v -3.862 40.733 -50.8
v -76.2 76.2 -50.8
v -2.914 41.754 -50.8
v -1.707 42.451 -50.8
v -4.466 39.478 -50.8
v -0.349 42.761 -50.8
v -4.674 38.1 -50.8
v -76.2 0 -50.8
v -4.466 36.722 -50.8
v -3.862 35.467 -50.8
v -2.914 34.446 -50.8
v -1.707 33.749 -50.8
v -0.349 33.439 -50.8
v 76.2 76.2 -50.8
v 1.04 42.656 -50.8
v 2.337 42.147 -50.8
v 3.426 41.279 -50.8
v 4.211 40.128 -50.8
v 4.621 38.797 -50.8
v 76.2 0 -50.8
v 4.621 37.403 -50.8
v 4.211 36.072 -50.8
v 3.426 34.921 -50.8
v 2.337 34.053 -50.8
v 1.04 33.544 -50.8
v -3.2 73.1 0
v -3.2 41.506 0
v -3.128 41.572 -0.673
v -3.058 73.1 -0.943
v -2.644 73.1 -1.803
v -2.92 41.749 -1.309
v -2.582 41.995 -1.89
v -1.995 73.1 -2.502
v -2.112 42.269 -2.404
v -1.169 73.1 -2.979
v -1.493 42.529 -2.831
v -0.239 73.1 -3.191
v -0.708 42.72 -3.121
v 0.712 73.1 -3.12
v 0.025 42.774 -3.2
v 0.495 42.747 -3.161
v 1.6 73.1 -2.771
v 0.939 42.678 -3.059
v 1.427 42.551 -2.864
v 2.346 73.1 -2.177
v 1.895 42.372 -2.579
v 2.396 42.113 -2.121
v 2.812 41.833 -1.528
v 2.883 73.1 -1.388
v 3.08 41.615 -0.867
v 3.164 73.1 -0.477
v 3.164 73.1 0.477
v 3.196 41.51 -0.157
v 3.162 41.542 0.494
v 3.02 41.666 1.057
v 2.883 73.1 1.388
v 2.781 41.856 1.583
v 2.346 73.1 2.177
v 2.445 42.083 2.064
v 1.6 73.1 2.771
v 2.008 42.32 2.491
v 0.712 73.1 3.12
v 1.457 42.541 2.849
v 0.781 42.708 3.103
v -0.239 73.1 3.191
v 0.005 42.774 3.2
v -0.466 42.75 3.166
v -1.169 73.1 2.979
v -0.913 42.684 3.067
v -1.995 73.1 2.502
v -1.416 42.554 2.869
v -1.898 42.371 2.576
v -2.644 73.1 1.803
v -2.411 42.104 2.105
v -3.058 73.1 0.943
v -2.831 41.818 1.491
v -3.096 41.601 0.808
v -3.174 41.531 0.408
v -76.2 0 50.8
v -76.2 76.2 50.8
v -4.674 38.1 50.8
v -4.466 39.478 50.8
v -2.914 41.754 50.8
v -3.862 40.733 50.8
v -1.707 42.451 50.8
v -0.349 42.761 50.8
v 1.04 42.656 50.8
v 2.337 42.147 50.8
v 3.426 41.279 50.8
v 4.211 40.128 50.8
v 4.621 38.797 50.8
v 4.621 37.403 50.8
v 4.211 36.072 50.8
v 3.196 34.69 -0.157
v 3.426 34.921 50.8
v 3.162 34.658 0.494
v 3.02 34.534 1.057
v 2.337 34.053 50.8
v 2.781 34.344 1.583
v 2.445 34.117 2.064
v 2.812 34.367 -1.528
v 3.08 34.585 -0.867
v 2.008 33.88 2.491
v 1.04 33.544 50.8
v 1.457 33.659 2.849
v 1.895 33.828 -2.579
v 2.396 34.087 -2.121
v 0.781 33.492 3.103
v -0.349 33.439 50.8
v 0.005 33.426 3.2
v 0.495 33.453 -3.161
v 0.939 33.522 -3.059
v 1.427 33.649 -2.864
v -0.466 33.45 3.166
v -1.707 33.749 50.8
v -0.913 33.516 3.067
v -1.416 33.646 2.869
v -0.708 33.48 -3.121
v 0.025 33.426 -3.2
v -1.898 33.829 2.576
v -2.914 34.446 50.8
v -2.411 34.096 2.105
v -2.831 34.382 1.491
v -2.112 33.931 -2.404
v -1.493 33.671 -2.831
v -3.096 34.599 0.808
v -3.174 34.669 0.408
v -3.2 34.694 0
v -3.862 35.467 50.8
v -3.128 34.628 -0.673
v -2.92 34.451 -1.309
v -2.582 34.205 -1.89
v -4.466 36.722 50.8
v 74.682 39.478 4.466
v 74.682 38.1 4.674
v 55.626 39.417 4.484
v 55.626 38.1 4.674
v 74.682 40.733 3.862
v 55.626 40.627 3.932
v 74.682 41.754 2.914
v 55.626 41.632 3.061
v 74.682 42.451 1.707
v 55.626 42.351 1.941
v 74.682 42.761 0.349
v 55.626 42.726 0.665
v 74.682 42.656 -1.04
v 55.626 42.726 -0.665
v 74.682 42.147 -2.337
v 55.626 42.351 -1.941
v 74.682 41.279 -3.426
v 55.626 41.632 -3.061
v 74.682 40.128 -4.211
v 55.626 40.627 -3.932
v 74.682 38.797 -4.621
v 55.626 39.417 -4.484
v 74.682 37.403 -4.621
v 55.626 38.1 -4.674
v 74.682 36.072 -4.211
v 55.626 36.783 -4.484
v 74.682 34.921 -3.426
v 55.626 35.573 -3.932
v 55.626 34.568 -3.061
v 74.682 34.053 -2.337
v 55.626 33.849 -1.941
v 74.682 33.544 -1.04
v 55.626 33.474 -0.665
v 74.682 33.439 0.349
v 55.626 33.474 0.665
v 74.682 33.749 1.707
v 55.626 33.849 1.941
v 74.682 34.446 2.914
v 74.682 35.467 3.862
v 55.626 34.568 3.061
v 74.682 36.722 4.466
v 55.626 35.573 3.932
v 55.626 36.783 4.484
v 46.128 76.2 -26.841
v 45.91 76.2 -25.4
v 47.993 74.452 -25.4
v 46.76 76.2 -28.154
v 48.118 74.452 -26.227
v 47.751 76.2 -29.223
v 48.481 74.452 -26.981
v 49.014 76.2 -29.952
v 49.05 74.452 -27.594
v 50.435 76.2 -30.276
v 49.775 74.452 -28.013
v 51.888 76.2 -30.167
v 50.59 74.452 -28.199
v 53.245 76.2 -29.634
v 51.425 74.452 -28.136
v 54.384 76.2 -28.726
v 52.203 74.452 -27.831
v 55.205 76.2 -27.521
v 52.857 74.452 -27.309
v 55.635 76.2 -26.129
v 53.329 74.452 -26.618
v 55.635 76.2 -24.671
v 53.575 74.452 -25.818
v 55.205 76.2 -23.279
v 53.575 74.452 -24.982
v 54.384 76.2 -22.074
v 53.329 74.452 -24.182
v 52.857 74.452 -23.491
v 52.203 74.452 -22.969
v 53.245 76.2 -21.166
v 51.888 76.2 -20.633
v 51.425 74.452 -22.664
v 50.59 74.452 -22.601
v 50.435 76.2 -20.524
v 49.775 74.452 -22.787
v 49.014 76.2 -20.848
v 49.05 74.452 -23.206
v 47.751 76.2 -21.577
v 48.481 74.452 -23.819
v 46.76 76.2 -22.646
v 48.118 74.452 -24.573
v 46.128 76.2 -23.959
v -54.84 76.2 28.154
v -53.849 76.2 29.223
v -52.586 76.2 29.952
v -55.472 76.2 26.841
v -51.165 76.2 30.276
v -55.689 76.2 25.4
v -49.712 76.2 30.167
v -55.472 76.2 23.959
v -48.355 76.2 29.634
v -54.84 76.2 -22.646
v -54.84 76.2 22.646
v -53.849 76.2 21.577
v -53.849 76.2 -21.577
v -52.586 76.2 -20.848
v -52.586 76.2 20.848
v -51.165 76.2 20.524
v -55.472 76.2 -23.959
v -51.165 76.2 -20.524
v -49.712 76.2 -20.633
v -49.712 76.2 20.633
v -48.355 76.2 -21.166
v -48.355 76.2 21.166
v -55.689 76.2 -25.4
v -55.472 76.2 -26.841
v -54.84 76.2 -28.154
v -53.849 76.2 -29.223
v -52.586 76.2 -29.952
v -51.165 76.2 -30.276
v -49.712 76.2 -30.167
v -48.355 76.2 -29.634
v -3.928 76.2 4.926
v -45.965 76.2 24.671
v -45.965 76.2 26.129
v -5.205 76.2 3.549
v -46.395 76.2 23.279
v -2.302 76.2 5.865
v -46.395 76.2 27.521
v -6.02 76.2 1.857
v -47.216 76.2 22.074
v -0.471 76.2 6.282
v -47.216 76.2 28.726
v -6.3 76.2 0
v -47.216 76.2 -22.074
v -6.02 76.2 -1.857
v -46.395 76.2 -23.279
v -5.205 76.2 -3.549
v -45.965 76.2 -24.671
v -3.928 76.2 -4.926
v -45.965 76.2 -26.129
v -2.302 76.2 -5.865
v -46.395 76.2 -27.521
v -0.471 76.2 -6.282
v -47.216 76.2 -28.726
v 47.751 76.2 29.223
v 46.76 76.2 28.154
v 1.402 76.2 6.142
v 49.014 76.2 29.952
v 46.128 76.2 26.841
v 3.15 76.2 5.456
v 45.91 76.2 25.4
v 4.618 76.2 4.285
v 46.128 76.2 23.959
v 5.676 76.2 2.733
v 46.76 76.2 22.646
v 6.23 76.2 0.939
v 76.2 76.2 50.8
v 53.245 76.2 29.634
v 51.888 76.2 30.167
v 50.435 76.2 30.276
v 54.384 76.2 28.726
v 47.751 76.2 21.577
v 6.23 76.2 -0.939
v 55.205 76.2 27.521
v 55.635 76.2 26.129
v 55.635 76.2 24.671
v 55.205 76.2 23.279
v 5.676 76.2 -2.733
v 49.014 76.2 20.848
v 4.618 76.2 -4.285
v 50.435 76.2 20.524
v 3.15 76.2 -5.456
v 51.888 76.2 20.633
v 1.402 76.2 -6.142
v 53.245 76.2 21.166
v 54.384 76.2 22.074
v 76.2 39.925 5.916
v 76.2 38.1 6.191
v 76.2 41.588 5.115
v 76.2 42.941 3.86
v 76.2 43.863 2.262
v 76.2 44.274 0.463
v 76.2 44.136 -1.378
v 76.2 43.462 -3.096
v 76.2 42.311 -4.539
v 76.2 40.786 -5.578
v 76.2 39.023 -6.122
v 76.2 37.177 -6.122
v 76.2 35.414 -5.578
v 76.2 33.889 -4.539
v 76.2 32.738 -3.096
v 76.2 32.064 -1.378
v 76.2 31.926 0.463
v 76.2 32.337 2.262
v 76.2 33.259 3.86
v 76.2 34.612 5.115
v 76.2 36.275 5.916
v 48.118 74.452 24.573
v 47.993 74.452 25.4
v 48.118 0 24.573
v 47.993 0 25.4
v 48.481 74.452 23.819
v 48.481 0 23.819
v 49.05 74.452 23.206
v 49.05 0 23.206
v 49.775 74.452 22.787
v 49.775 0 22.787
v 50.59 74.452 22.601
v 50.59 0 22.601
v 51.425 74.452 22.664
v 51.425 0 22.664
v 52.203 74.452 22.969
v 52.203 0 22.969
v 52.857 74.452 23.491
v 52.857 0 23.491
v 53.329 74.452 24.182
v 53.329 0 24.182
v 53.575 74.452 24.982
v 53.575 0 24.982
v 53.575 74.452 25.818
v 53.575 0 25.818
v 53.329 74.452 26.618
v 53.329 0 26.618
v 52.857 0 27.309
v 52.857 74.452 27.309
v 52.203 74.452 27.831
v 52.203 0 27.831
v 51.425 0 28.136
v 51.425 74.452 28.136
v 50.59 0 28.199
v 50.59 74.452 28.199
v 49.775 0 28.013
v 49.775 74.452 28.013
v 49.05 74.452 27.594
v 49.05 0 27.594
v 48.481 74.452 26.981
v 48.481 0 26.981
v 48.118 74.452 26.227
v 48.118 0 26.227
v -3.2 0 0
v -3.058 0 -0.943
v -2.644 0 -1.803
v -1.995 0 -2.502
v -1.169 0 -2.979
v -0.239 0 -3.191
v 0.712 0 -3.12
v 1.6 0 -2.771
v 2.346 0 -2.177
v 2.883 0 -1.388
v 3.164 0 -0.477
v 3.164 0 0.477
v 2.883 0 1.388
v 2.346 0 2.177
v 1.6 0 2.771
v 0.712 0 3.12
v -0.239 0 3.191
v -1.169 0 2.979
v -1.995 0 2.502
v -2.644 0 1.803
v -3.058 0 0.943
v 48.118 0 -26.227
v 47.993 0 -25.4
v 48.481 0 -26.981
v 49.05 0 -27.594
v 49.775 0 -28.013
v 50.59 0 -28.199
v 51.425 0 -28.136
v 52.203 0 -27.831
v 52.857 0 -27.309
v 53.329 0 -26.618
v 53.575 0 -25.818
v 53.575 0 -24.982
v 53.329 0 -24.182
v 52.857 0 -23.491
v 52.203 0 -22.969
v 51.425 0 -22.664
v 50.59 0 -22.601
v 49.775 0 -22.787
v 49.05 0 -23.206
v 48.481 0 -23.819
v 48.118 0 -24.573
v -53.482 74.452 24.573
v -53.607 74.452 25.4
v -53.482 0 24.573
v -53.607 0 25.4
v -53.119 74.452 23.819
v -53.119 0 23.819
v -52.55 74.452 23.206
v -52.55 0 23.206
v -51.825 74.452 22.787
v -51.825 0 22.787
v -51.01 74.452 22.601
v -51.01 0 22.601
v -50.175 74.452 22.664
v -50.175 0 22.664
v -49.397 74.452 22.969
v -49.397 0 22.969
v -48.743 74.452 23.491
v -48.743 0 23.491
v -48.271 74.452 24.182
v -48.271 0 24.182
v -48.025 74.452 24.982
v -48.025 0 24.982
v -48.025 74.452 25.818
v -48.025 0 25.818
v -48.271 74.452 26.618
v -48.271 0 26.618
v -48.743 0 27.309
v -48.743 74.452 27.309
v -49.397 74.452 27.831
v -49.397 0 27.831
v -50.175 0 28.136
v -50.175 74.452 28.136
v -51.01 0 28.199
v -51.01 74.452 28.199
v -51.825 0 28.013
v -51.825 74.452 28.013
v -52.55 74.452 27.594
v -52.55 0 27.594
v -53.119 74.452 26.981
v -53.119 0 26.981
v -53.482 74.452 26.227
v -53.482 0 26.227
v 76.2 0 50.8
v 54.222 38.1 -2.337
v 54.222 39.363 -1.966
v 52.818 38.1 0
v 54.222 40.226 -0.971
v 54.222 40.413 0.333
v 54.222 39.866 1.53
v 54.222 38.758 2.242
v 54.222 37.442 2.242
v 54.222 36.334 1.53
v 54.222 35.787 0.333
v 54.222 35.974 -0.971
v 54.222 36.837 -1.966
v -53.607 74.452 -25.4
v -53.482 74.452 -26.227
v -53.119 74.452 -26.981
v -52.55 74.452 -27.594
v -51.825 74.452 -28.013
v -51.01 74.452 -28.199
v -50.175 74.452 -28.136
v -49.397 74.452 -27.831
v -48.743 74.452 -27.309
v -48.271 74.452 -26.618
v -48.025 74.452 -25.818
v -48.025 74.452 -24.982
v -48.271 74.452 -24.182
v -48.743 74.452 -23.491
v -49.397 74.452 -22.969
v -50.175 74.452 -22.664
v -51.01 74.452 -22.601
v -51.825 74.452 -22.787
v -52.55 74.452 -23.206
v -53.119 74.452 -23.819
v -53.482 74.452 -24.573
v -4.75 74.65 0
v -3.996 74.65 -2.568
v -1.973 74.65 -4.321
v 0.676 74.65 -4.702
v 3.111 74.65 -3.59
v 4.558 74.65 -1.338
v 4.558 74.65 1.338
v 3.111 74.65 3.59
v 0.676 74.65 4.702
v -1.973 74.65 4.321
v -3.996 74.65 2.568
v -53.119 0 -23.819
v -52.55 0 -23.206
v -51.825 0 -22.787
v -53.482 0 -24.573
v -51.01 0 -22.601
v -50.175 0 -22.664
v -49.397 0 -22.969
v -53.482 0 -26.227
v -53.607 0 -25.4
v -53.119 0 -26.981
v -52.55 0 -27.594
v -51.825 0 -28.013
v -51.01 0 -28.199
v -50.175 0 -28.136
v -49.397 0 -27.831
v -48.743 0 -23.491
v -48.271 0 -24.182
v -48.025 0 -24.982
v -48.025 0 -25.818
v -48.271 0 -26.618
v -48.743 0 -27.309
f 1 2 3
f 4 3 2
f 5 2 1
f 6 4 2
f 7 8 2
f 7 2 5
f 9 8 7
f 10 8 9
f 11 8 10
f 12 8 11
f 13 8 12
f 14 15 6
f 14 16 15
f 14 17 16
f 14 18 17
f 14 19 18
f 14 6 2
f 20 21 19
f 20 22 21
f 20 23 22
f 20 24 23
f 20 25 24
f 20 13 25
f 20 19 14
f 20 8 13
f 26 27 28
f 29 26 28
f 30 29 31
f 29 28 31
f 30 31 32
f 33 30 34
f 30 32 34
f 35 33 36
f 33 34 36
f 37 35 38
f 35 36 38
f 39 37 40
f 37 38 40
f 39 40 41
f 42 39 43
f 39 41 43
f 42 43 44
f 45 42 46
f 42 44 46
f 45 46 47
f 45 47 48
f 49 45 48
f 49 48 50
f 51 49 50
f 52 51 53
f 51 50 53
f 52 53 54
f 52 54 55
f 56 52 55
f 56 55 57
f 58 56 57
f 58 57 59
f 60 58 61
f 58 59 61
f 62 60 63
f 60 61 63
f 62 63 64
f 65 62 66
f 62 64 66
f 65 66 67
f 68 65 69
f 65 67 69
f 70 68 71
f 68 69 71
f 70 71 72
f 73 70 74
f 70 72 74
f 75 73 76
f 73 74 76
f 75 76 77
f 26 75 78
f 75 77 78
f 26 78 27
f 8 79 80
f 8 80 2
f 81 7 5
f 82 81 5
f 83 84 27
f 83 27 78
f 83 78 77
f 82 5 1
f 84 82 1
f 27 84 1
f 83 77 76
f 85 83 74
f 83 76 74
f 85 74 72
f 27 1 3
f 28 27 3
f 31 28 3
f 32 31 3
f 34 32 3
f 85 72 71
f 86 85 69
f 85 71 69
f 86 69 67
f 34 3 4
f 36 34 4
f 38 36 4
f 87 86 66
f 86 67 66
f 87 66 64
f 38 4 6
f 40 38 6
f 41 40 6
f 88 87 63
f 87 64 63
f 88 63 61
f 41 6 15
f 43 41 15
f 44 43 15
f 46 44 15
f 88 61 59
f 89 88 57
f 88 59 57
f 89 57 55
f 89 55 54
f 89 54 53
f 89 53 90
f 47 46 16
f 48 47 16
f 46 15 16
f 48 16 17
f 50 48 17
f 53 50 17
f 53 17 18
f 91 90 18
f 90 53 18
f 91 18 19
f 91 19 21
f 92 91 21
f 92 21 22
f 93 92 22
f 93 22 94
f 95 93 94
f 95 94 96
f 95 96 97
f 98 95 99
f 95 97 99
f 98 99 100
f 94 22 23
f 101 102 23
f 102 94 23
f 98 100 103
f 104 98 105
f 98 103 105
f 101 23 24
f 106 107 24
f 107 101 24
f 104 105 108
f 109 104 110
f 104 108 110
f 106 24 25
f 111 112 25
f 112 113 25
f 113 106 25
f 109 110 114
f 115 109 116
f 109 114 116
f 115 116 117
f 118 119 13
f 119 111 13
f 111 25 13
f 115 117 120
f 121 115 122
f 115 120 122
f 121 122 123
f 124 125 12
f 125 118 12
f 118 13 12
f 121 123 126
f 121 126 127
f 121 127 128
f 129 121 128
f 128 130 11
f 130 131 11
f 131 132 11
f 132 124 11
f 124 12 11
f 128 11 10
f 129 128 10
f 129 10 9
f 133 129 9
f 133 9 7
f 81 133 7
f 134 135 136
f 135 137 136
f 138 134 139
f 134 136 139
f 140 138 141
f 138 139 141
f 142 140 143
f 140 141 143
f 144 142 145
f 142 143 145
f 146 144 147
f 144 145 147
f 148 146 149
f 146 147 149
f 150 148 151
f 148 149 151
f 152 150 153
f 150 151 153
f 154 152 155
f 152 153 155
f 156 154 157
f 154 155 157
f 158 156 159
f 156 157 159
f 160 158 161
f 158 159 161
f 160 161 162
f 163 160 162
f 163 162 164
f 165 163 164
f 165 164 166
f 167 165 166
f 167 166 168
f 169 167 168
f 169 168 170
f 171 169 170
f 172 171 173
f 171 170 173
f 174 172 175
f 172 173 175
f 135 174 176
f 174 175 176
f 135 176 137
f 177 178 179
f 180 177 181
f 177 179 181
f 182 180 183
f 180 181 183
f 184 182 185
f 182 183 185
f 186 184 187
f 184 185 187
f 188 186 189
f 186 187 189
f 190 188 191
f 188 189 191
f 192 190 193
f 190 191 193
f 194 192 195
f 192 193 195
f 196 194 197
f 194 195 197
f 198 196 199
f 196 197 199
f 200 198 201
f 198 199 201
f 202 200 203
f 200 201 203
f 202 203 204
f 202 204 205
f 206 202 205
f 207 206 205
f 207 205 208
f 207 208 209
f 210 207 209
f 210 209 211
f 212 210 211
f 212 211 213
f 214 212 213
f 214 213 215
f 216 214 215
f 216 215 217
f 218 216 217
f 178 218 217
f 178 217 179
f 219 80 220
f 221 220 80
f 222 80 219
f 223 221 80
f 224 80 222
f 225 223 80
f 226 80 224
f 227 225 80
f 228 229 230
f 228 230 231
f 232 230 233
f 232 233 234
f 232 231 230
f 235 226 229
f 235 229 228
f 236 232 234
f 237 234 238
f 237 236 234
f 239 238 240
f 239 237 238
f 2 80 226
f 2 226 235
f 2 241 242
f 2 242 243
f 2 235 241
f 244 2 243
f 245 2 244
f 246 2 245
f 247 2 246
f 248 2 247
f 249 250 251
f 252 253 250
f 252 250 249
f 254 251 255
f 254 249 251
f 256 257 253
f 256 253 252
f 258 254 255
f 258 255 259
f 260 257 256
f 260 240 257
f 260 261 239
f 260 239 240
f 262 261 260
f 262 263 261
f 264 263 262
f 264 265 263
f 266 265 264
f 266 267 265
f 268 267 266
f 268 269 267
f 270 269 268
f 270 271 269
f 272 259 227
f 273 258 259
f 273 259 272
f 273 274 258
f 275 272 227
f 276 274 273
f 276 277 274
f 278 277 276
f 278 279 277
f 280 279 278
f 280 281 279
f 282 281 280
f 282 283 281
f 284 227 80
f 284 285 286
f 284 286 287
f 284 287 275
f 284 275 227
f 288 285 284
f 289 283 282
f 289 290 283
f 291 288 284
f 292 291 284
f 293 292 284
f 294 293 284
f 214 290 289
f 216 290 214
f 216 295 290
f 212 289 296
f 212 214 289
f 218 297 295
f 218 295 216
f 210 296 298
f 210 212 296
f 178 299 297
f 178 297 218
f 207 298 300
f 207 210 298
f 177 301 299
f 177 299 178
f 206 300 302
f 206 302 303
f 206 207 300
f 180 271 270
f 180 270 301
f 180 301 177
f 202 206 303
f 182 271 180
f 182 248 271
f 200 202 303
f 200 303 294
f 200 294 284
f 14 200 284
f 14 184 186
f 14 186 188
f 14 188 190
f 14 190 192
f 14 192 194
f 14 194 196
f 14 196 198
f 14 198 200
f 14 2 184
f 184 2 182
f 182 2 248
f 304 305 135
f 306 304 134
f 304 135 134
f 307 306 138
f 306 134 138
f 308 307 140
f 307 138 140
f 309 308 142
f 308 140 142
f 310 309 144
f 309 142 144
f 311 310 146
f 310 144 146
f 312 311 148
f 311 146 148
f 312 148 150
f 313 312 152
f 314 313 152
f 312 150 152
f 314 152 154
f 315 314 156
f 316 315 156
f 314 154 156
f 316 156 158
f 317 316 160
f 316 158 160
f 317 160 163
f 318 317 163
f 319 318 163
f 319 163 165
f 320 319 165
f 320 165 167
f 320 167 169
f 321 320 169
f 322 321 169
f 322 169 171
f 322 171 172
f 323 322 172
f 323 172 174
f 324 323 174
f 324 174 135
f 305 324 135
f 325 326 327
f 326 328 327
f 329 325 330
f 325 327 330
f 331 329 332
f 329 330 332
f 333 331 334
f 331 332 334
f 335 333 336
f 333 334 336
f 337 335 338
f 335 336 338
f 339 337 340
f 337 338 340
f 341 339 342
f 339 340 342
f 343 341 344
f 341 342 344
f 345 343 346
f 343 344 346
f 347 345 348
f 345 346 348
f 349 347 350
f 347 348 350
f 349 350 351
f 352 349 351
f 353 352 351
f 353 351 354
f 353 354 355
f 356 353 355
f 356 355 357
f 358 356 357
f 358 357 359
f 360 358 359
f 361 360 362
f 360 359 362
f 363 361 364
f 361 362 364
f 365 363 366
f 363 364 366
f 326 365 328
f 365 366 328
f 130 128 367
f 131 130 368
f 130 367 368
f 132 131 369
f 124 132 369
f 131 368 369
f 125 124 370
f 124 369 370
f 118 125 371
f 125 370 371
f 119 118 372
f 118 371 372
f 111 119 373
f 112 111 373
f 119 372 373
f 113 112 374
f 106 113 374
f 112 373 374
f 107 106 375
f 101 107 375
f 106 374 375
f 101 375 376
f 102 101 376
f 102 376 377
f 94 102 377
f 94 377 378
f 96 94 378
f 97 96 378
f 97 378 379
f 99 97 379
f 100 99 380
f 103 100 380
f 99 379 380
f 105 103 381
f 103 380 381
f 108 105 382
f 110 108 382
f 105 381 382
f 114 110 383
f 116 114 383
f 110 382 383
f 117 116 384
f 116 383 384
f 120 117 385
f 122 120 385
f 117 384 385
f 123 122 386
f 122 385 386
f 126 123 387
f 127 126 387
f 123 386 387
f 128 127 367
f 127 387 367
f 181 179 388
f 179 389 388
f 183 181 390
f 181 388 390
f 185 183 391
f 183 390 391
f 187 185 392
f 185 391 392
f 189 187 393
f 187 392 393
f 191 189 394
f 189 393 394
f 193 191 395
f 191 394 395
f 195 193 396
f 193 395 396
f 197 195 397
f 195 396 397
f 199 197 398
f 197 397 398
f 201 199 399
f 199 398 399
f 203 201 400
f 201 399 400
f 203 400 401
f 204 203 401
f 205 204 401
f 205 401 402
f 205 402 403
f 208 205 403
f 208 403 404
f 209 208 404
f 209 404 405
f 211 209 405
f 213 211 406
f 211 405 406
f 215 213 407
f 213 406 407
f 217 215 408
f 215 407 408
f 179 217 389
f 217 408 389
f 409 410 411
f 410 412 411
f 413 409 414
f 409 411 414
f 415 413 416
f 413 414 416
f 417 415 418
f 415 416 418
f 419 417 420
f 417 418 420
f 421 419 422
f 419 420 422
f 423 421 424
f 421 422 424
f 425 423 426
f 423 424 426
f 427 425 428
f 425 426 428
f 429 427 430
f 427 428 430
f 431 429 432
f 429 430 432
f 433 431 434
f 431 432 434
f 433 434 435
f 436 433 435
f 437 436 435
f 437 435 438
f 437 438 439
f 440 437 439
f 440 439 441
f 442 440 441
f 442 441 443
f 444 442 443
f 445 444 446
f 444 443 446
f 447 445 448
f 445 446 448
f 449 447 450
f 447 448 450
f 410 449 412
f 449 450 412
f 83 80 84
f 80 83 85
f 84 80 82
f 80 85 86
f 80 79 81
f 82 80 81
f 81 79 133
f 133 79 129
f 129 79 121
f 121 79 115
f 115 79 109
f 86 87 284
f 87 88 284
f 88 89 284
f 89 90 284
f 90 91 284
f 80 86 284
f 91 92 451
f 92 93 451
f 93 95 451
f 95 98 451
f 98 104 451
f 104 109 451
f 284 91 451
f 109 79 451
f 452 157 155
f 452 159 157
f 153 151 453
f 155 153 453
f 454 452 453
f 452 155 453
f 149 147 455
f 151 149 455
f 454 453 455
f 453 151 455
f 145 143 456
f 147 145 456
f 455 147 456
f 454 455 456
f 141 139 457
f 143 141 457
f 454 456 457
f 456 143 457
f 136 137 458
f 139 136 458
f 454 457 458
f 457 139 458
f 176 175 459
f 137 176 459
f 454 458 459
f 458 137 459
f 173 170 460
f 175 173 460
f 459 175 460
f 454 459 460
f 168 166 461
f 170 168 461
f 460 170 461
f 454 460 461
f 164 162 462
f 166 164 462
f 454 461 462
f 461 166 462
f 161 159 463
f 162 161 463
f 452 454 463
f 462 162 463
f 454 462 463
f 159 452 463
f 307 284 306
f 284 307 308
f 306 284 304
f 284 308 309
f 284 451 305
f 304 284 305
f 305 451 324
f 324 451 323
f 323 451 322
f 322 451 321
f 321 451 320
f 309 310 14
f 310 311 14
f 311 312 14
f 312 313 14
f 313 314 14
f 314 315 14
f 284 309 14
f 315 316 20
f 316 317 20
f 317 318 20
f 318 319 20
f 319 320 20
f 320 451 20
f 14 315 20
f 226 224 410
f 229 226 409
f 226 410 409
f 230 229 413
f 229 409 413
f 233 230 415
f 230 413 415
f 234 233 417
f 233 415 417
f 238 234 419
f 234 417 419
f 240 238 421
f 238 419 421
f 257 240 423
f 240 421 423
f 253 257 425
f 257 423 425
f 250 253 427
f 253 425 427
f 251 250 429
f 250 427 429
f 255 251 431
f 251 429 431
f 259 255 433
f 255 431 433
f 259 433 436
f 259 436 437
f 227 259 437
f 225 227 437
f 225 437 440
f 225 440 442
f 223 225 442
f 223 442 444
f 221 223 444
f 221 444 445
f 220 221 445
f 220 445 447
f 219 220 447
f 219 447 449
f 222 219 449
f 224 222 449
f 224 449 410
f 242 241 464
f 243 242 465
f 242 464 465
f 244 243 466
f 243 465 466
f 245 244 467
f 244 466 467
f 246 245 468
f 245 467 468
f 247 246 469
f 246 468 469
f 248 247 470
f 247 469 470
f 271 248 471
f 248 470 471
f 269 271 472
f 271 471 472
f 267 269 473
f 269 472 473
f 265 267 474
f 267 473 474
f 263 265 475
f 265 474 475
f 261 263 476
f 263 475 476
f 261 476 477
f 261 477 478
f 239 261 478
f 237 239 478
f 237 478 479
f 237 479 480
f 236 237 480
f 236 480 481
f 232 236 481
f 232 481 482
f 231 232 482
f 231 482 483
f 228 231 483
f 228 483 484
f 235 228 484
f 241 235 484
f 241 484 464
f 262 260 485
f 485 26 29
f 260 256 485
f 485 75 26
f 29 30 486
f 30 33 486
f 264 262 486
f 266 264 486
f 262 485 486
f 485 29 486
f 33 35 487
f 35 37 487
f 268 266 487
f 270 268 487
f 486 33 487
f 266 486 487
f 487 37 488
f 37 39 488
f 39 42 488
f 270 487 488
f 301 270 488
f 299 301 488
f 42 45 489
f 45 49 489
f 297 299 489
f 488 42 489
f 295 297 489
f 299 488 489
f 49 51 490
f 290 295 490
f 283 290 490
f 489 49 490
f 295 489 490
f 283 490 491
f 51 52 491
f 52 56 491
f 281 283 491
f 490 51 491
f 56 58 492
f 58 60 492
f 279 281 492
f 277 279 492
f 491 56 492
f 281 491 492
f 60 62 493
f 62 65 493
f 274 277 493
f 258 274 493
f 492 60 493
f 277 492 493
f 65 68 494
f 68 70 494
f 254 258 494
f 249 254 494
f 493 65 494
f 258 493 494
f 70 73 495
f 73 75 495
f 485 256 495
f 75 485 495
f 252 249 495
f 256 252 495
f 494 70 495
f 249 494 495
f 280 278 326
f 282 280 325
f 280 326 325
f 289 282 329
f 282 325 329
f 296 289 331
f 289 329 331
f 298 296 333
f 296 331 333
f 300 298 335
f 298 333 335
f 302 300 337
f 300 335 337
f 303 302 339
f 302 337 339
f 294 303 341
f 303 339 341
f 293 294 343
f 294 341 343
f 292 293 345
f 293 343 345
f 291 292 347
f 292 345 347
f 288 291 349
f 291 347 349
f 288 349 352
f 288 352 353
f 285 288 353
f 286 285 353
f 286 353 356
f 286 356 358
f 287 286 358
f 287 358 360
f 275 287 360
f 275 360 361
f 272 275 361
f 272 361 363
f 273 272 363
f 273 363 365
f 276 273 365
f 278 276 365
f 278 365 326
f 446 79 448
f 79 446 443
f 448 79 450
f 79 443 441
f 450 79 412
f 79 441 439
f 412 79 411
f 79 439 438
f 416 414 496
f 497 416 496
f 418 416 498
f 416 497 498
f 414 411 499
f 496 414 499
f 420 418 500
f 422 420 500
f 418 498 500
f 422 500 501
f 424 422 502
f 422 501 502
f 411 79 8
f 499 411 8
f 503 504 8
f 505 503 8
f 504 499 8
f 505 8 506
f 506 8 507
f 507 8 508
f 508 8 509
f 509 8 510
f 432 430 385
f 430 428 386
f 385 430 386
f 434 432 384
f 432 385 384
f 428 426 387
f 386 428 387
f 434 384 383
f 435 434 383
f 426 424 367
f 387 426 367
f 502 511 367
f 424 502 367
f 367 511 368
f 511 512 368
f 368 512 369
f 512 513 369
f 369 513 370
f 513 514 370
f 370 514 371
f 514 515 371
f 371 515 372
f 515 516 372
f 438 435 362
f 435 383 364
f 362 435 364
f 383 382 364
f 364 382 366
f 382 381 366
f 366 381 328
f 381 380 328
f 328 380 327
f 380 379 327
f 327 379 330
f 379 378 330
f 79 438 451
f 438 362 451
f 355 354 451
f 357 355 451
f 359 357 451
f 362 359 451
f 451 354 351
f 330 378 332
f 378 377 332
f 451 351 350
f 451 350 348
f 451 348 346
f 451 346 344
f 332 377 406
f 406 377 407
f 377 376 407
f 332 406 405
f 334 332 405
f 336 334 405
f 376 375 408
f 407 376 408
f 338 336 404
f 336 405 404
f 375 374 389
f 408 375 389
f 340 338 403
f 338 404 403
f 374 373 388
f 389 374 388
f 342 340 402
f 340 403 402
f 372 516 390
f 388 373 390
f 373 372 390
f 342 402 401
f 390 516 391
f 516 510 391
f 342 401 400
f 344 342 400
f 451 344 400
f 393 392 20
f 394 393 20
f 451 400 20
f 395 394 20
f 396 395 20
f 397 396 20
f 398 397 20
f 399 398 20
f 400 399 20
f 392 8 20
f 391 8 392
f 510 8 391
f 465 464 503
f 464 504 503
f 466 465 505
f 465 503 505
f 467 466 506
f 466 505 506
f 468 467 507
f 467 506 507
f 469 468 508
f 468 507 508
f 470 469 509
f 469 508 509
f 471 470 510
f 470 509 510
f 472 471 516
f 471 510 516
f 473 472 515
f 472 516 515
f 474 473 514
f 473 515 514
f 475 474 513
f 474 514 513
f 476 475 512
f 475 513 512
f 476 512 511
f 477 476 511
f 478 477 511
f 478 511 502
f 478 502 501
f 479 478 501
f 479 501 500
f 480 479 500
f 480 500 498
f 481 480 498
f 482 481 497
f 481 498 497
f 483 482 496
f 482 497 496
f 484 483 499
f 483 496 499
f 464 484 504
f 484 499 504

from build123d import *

# Parameters (mm, degrees)
SKETCH1_W                                          = 152.4
SKETCH1_H                                          = 101.6
BOSS_EXTRUDE1_DEPTH                                = 76.2
CSK_FOR_10_FLAT_HEAD_MACHINE_SCREW_100_D           = 5.6134
CSK_FOR_10_FLAT_HEAD_MACHINE_SCREW_100_CSINK_D     = 9.779
CSK_FOR_10_FLAT_HEAD_MACHINE_SCREW_100_CSINK_ANGLE = 100
CSK_FOR_M6_FLAT_HEAD_MACHINE_SCREW1_D              = 6.4
CSK_FOR_M6_FLAT_HEAD_MACHINE_SCREW1_CSINK_D        = 12.6
CSK_FOR_M6_FLAT_HEAD_MACHINE_SCREW1_CSINK_ANGLE    = 90
F_7_16_14_TAPPED_HOLE3_D                           = 9.3472
F_7_16_14_TAPPED_HOLE3_DEPTH                       = 20.574
F_7_16_14_TAPPED_HOLE3_CSINK_D                     = 12.3825
F_7_16_14_TAPPED_HOLE3_CSINK_ANGLE                 = 90
F_7_16_14_TAPPED_HOLE3_TIP                         = 2.808182189
F_7_16_14_TAPPED_HOLE2_D                           = 9.3472


with BuildPart() as part:
    # Sketch1 → Boss-Extrude1 (new body)
    with BuildSketch(Plane(origin=(0, 0, 0), x_dir=(1, 0, 0), z_dir=(0, 1, 0))):
        Rectangle(SKETCH1_W, SKETCH1_H)
    extrude(amount=BOSS_EXTRUDE1_DEPTH)

    # CSK for #10 Flat Head Machine Screw (100)1 (through all)
    with Locations(Plane(origin=(0, 76.2, 0), x_dir=(1, 0, 0), z_dir=(0, 1, 0))):
        with Locations((-50.8, 25.4), (-50.8, -25.4), (50.8, -25.4), (50.8, 25.4)):
            CounterSinkHole(CSK_FOR_10_FLAT_HEAD_MACHINE_SCREW_100_D / 2, CSK_FOR_10_FLAT_HEAD_MACHINE_SCREW_100_CSINK_D / 2, counter_sink_angle=CSK_FOR_10_FLAT_HEAD_MACHINE_SCREW_100_CSINK_ANGLE)

    # CSK for M6 Flat Head Machine Screw1 (through all)
    with Locations(Plane(origin=(0, 76.2, 0), x_dir=(1, 0, 0), z_dir=(0, 1, 0))):
        with Locations((0, 0)):
            CounterSinkHole(CSK_FOR_M6_FLAT_HEAD_MACHINE_SCREW1_D / 2, CSK_FOR_M6_FLAT_HEAD_MACHINE_SCREW1_CSINK_D / 2, counter_sink_angle=CSK_FOR_M6_FLAT_HEAD_MACHINE_SCREW1_CSINK_ANGLE)

    # 7/16-14 Tapped Hole3
    with Locations(Plane(origin=(76.2, 0, 0), x_dir=(0, 0, -1), z_dir=(1, 0, 0))):
        with Locations((0, 38.1)):
            CounterSinkHole(F_7_16_14_TAPPED_HOLE3_D / 2, F_7_16_14_TAPPED_HOLE3_CSINK_D / 2, depth=F_7_16_14_TAPPED_HOLE3_DEPTH, counter_sink_angle=F_7_16_14_TAPPED_HOLE3_CSINK_ANGLE)
            with Locations((0, 0, -(F_7_16_14_TAPPED_HOLE3_DEPTH + F_7_16_14_TAPPED_HOLE3_TIP / 2))):  # 118° drill point
                Cone(0, F_7_16_14_TAPPED_HOLE3_D / 2, F_7_16_14_TAPPED_HOLE3_TIP, mode=Mode.SUBTRACT)

    # 7/16-14 Tapped Hole2 (through all)
    with Locations(Plane.XY.offset(50.8)):
        with Locations((0, 38.1)):
            Hole(F_7_16_14_TAPPED_HOLE2_D / 2)


solid = part.part
